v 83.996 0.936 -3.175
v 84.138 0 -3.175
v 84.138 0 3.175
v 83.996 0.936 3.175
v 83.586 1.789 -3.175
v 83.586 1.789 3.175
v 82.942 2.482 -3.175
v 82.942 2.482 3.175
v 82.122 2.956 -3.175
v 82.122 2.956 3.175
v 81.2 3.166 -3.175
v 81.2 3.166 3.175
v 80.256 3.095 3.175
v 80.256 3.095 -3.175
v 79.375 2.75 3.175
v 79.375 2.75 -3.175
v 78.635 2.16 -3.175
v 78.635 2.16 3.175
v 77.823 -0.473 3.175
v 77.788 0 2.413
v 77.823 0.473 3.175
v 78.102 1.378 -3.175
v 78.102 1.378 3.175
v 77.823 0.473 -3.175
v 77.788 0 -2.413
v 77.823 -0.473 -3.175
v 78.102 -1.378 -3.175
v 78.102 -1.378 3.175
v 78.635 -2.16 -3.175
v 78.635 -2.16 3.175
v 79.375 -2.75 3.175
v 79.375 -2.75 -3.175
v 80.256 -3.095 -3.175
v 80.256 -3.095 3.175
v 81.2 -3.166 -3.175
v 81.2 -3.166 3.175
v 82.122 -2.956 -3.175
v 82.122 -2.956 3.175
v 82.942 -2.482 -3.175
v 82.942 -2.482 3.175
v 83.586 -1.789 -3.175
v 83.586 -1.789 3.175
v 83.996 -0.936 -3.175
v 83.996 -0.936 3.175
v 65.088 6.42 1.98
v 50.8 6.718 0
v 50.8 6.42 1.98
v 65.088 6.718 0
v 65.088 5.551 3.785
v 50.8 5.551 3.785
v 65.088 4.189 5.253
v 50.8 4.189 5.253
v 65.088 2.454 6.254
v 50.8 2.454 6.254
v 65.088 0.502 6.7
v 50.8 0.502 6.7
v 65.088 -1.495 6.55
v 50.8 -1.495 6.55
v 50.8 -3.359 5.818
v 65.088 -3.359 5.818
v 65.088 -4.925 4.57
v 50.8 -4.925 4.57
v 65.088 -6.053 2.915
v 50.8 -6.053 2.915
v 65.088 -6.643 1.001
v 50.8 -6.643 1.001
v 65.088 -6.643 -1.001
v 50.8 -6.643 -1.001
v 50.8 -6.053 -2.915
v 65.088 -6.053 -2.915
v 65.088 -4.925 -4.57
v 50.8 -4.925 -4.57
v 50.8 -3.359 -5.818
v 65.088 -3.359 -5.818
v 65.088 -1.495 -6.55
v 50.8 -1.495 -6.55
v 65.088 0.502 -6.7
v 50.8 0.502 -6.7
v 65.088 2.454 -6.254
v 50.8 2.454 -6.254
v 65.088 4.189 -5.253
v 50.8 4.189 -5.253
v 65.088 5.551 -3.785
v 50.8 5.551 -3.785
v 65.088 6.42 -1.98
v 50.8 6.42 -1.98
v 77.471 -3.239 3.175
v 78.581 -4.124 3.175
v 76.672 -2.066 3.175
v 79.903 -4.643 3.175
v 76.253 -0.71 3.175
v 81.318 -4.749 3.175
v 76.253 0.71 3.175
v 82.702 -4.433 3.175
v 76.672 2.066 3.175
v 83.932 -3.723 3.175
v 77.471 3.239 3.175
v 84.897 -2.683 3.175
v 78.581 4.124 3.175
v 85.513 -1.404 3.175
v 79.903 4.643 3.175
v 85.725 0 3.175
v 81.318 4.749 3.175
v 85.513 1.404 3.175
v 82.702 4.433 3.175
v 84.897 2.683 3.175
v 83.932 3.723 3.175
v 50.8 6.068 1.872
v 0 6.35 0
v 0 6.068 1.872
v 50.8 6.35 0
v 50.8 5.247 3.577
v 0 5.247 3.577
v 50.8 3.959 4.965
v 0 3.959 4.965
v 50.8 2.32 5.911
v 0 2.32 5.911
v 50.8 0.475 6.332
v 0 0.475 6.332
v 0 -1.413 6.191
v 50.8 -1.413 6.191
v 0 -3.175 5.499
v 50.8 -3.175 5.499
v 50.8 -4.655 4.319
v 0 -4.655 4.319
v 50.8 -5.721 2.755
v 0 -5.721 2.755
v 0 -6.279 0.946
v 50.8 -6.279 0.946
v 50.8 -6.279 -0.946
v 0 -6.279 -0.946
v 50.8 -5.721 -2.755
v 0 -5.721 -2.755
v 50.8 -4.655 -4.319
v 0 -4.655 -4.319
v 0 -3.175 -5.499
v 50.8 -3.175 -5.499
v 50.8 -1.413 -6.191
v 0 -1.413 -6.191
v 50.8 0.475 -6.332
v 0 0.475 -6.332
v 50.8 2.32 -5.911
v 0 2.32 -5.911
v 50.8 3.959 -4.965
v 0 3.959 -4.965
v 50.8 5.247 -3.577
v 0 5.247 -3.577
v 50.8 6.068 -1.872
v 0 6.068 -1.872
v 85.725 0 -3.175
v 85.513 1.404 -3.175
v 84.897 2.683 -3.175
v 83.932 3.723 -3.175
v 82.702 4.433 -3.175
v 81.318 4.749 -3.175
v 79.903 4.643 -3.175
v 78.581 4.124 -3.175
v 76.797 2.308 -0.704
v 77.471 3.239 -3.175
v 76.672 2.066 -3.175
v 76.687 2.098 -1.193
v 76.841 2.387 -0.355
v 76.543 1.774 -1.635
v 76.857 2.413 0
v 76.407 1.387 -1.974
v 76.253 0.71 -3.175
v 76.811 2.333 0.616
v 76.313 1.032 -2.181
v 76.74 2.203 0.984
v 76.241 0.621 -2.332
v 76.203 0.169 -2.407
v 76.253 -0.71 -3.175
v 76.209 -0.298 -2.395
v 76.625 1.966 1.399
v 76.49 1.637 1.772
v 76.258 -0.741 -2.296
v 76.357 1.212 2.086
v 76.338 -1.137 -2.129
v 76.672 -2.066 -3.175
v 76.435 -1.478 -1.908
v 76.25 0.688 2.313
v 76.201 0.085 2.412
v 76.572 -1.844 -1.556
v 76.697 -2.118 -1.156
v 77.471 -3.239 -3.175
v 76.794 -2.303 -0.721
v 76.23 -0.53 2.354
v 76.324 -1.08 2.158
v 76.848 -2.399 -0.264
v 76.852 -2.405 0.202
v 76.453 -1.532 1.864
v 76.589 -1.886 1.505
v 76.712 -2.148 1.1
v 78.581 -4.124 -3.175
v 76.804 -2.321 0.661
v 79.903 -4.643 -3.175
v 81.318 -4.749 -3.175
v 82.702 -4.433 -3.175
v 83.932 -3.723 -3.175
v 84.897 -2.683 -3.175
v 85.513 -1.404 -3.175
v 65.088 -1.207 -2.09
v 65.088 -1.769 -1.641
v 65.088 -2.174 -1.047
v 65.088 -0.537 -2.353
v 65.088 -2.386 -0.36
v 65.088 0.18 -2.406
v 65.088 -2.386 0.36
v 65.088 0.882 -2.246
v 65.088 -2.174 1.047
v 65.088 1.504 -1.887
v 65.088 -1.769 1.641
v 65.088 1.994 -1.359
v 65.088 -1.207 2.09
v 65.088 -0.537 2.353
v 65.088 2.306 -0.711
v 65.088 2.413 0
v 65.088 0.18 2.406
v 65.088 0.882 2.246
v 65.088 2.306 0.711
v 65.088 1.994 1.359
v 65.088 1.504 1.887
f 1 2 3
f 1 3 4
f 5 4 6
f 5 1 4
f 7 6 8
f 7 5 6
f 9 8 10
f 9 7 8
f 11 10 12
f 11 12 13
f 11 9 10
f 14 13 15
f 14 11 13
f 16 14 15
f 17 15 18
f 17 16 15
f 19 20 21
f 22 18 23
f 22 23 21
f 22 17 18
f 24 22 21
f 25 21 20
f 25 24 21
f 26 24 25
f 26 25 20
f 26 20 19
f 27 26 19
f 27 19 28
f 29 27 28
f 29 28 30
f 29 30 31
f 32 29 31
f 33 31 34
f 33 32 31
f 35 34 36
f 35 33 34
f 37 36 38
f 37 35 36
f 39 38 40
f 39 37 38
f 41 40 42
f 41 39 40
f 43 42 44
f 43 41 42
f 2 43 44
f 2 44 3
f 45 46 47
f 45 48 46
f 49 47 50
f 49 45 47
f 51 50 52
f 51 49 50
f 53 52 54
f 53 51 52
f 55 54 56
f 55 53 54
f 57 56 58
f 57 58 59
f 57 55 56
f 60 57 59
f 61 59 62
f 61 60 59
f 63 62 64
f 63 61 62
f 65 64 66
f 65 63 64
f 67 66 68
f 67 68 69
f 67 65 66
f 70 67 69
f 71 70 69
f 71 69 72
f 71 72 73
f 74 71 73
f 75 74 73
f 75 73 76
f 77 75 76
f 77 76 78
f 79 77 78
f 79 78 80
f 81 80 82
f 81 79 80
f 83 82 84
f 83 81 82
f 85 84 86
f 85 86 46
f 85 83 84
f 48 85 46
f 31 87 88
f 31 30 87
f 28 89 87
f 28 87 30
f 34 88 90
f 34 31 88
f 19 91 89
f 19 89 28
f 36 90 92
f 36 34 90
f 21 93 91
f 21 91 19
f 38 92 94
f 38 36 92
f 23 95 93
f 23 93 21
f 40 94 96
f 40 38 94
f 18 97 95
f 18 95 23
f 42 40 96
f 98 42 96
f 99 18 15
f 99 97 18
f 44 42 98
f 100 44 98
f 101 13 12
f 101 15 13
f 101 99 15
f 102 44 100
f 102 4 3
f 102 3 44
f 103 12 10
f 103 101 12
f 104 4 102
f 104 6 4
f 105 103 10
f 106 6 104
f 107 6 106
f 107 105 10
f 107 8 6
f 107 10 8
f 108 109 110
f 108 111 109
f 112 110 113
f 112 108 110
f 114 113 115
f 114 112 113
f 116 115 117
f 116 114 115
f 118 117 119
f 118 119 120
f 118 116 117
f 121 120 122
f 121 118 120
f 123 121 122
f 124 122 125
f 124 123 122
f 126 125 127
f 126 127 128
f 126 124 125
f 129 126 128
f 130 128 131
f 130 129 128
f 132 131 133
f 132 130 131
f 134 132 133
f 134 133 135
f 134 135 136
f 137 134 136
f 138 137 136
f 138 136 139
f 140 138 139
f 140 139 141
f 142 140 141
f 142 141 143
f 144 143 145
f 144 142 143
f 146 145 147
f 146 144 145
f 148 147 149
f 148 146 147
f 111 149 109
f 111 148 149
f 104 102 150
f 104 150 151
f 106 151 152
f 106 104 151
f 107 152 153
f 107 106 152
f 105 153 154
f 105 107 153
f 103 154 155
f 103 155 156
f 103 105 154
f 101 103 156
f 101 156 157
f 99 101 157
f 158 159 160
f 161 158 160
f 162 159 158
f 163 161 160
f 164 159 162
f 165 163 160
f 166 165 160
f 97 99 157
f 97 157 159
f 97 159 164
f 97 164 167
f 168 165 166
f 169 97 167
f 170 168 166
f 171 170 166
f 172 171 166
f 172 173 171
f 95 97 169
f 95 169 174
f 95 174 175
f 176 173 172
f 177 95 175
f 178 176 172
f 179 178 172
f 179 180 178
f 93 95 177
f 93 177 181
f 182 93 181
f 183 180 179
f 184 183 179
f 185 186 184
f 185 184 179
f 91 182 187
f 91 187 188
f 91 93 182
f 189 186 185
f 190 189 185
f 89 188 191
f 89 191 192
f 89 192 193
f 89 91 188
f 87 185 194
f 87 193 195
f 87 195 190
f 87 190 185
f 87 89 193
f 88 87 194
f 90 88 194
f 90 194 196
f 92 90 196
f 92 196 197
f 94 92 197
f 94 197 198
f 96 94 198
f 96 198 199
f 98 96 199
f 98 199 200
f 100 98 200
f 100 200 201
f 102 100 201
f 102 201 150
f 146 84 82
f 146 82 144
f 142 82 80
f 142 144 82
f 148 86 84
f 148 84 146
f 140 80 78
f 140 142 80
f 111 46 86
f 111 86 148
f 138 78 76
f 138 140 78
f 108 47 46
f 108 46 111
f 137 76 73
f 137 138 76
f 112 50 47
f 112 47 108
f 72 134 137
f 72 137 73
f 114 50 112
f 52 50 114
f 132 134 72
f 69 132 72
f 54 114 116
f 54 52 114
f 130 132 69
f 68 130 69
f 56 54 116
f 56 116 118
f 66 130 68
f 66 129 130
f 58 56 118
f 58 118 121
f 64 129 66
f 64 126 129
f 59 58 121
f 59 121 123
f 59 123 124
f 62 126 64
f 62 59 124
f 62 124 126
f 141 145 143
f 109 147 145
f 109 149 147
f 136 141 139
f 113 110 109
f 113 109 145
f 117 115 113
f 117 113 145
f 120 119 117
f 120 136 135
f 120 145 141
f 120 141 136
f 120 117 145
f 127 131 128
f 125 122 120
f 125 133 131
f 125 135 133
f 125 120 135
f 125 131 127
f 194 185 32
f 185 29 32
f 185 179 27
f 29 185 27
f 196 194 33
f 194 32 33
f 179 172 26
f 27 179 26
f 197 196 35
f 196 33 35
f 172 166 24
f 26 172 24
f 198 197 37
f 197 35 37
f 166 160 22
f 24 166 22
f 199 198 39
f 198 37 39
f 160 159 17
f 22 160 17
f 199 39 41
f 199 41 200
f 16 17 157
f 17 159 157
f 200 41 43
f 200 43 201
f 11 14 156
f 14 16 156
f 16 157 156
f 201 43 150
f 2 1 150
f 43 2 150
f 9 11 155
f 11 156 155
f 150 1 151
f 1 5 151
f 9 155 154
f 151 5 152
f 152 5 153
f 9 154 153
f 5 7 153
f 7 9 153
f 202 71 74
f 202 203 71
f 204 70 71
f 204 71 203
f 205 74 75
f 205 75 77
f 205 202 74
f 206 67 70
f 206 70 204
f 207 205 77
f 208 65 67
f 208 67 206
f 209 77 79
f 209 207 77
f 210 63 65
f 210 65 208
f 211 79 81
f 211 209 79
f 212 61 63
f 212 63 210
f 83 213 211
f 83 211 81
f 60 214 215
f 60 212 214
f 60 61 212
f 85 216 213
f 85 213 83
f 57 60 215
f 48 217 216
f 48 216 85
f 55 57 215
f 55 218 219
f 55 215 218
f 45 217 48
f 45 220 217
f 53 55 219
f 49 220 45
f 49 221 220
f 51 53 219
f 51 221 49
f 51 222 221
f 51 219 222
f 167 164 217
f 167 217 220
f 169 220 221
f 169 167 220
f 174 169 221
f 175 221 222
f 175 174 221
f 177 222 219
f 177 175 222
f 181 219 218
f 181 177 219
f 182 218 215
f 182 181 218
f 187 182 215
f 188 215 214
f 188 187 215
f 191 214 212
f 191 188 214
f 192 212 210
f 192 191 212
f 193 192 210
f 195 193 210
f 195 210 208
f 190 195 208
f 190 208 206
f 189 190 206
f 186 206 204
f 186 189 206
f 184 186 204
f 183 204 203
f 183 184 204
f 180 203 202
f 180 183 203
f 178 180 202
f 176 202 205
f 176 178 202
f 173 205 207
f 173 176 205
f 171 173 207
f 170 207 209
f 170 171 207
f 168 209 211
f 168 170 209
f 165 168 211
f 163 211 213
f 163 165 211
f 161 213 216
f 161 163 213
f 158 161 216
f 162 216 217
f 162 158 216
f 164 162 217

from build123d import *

# Parameters (mm, degrees)
SKETCH3_R           = 4.7625
SKETCH3_R_2         = 3.175
BOSS_EXTRUDE1_DEPTH = 3.175


with BuildPart() as part:
    # Sketch2 → Revolve1 (revolve)
    with BuildSketch(Plane.XY):
        Polygon((0, 0), (0, 6.35), (50.8, 6.35), (50.8, 6.7183), (65.0875, 6.7183), (65.0875, 2.413), (77.7875, 2.413), (77.7875, 0), align=None)
    revolve(axis=Axis((0, 0, 0), (1, 0, 0)))

    # Sketch3 → Boss-Extrude1 (add, symmetric)
    with BuildSketch(Plane.XY):
        with Locations((80.9625, 0)):
            Circle(SKETCH3_R)
        with Locations((80.9625, 0)):
            Circle(SKETCH3_R_2, mode=Mode.SUBTRACT)
    extrude(amount=BOSS_EXTRUDE1_DEPTH, both=True)


solid = part.part
